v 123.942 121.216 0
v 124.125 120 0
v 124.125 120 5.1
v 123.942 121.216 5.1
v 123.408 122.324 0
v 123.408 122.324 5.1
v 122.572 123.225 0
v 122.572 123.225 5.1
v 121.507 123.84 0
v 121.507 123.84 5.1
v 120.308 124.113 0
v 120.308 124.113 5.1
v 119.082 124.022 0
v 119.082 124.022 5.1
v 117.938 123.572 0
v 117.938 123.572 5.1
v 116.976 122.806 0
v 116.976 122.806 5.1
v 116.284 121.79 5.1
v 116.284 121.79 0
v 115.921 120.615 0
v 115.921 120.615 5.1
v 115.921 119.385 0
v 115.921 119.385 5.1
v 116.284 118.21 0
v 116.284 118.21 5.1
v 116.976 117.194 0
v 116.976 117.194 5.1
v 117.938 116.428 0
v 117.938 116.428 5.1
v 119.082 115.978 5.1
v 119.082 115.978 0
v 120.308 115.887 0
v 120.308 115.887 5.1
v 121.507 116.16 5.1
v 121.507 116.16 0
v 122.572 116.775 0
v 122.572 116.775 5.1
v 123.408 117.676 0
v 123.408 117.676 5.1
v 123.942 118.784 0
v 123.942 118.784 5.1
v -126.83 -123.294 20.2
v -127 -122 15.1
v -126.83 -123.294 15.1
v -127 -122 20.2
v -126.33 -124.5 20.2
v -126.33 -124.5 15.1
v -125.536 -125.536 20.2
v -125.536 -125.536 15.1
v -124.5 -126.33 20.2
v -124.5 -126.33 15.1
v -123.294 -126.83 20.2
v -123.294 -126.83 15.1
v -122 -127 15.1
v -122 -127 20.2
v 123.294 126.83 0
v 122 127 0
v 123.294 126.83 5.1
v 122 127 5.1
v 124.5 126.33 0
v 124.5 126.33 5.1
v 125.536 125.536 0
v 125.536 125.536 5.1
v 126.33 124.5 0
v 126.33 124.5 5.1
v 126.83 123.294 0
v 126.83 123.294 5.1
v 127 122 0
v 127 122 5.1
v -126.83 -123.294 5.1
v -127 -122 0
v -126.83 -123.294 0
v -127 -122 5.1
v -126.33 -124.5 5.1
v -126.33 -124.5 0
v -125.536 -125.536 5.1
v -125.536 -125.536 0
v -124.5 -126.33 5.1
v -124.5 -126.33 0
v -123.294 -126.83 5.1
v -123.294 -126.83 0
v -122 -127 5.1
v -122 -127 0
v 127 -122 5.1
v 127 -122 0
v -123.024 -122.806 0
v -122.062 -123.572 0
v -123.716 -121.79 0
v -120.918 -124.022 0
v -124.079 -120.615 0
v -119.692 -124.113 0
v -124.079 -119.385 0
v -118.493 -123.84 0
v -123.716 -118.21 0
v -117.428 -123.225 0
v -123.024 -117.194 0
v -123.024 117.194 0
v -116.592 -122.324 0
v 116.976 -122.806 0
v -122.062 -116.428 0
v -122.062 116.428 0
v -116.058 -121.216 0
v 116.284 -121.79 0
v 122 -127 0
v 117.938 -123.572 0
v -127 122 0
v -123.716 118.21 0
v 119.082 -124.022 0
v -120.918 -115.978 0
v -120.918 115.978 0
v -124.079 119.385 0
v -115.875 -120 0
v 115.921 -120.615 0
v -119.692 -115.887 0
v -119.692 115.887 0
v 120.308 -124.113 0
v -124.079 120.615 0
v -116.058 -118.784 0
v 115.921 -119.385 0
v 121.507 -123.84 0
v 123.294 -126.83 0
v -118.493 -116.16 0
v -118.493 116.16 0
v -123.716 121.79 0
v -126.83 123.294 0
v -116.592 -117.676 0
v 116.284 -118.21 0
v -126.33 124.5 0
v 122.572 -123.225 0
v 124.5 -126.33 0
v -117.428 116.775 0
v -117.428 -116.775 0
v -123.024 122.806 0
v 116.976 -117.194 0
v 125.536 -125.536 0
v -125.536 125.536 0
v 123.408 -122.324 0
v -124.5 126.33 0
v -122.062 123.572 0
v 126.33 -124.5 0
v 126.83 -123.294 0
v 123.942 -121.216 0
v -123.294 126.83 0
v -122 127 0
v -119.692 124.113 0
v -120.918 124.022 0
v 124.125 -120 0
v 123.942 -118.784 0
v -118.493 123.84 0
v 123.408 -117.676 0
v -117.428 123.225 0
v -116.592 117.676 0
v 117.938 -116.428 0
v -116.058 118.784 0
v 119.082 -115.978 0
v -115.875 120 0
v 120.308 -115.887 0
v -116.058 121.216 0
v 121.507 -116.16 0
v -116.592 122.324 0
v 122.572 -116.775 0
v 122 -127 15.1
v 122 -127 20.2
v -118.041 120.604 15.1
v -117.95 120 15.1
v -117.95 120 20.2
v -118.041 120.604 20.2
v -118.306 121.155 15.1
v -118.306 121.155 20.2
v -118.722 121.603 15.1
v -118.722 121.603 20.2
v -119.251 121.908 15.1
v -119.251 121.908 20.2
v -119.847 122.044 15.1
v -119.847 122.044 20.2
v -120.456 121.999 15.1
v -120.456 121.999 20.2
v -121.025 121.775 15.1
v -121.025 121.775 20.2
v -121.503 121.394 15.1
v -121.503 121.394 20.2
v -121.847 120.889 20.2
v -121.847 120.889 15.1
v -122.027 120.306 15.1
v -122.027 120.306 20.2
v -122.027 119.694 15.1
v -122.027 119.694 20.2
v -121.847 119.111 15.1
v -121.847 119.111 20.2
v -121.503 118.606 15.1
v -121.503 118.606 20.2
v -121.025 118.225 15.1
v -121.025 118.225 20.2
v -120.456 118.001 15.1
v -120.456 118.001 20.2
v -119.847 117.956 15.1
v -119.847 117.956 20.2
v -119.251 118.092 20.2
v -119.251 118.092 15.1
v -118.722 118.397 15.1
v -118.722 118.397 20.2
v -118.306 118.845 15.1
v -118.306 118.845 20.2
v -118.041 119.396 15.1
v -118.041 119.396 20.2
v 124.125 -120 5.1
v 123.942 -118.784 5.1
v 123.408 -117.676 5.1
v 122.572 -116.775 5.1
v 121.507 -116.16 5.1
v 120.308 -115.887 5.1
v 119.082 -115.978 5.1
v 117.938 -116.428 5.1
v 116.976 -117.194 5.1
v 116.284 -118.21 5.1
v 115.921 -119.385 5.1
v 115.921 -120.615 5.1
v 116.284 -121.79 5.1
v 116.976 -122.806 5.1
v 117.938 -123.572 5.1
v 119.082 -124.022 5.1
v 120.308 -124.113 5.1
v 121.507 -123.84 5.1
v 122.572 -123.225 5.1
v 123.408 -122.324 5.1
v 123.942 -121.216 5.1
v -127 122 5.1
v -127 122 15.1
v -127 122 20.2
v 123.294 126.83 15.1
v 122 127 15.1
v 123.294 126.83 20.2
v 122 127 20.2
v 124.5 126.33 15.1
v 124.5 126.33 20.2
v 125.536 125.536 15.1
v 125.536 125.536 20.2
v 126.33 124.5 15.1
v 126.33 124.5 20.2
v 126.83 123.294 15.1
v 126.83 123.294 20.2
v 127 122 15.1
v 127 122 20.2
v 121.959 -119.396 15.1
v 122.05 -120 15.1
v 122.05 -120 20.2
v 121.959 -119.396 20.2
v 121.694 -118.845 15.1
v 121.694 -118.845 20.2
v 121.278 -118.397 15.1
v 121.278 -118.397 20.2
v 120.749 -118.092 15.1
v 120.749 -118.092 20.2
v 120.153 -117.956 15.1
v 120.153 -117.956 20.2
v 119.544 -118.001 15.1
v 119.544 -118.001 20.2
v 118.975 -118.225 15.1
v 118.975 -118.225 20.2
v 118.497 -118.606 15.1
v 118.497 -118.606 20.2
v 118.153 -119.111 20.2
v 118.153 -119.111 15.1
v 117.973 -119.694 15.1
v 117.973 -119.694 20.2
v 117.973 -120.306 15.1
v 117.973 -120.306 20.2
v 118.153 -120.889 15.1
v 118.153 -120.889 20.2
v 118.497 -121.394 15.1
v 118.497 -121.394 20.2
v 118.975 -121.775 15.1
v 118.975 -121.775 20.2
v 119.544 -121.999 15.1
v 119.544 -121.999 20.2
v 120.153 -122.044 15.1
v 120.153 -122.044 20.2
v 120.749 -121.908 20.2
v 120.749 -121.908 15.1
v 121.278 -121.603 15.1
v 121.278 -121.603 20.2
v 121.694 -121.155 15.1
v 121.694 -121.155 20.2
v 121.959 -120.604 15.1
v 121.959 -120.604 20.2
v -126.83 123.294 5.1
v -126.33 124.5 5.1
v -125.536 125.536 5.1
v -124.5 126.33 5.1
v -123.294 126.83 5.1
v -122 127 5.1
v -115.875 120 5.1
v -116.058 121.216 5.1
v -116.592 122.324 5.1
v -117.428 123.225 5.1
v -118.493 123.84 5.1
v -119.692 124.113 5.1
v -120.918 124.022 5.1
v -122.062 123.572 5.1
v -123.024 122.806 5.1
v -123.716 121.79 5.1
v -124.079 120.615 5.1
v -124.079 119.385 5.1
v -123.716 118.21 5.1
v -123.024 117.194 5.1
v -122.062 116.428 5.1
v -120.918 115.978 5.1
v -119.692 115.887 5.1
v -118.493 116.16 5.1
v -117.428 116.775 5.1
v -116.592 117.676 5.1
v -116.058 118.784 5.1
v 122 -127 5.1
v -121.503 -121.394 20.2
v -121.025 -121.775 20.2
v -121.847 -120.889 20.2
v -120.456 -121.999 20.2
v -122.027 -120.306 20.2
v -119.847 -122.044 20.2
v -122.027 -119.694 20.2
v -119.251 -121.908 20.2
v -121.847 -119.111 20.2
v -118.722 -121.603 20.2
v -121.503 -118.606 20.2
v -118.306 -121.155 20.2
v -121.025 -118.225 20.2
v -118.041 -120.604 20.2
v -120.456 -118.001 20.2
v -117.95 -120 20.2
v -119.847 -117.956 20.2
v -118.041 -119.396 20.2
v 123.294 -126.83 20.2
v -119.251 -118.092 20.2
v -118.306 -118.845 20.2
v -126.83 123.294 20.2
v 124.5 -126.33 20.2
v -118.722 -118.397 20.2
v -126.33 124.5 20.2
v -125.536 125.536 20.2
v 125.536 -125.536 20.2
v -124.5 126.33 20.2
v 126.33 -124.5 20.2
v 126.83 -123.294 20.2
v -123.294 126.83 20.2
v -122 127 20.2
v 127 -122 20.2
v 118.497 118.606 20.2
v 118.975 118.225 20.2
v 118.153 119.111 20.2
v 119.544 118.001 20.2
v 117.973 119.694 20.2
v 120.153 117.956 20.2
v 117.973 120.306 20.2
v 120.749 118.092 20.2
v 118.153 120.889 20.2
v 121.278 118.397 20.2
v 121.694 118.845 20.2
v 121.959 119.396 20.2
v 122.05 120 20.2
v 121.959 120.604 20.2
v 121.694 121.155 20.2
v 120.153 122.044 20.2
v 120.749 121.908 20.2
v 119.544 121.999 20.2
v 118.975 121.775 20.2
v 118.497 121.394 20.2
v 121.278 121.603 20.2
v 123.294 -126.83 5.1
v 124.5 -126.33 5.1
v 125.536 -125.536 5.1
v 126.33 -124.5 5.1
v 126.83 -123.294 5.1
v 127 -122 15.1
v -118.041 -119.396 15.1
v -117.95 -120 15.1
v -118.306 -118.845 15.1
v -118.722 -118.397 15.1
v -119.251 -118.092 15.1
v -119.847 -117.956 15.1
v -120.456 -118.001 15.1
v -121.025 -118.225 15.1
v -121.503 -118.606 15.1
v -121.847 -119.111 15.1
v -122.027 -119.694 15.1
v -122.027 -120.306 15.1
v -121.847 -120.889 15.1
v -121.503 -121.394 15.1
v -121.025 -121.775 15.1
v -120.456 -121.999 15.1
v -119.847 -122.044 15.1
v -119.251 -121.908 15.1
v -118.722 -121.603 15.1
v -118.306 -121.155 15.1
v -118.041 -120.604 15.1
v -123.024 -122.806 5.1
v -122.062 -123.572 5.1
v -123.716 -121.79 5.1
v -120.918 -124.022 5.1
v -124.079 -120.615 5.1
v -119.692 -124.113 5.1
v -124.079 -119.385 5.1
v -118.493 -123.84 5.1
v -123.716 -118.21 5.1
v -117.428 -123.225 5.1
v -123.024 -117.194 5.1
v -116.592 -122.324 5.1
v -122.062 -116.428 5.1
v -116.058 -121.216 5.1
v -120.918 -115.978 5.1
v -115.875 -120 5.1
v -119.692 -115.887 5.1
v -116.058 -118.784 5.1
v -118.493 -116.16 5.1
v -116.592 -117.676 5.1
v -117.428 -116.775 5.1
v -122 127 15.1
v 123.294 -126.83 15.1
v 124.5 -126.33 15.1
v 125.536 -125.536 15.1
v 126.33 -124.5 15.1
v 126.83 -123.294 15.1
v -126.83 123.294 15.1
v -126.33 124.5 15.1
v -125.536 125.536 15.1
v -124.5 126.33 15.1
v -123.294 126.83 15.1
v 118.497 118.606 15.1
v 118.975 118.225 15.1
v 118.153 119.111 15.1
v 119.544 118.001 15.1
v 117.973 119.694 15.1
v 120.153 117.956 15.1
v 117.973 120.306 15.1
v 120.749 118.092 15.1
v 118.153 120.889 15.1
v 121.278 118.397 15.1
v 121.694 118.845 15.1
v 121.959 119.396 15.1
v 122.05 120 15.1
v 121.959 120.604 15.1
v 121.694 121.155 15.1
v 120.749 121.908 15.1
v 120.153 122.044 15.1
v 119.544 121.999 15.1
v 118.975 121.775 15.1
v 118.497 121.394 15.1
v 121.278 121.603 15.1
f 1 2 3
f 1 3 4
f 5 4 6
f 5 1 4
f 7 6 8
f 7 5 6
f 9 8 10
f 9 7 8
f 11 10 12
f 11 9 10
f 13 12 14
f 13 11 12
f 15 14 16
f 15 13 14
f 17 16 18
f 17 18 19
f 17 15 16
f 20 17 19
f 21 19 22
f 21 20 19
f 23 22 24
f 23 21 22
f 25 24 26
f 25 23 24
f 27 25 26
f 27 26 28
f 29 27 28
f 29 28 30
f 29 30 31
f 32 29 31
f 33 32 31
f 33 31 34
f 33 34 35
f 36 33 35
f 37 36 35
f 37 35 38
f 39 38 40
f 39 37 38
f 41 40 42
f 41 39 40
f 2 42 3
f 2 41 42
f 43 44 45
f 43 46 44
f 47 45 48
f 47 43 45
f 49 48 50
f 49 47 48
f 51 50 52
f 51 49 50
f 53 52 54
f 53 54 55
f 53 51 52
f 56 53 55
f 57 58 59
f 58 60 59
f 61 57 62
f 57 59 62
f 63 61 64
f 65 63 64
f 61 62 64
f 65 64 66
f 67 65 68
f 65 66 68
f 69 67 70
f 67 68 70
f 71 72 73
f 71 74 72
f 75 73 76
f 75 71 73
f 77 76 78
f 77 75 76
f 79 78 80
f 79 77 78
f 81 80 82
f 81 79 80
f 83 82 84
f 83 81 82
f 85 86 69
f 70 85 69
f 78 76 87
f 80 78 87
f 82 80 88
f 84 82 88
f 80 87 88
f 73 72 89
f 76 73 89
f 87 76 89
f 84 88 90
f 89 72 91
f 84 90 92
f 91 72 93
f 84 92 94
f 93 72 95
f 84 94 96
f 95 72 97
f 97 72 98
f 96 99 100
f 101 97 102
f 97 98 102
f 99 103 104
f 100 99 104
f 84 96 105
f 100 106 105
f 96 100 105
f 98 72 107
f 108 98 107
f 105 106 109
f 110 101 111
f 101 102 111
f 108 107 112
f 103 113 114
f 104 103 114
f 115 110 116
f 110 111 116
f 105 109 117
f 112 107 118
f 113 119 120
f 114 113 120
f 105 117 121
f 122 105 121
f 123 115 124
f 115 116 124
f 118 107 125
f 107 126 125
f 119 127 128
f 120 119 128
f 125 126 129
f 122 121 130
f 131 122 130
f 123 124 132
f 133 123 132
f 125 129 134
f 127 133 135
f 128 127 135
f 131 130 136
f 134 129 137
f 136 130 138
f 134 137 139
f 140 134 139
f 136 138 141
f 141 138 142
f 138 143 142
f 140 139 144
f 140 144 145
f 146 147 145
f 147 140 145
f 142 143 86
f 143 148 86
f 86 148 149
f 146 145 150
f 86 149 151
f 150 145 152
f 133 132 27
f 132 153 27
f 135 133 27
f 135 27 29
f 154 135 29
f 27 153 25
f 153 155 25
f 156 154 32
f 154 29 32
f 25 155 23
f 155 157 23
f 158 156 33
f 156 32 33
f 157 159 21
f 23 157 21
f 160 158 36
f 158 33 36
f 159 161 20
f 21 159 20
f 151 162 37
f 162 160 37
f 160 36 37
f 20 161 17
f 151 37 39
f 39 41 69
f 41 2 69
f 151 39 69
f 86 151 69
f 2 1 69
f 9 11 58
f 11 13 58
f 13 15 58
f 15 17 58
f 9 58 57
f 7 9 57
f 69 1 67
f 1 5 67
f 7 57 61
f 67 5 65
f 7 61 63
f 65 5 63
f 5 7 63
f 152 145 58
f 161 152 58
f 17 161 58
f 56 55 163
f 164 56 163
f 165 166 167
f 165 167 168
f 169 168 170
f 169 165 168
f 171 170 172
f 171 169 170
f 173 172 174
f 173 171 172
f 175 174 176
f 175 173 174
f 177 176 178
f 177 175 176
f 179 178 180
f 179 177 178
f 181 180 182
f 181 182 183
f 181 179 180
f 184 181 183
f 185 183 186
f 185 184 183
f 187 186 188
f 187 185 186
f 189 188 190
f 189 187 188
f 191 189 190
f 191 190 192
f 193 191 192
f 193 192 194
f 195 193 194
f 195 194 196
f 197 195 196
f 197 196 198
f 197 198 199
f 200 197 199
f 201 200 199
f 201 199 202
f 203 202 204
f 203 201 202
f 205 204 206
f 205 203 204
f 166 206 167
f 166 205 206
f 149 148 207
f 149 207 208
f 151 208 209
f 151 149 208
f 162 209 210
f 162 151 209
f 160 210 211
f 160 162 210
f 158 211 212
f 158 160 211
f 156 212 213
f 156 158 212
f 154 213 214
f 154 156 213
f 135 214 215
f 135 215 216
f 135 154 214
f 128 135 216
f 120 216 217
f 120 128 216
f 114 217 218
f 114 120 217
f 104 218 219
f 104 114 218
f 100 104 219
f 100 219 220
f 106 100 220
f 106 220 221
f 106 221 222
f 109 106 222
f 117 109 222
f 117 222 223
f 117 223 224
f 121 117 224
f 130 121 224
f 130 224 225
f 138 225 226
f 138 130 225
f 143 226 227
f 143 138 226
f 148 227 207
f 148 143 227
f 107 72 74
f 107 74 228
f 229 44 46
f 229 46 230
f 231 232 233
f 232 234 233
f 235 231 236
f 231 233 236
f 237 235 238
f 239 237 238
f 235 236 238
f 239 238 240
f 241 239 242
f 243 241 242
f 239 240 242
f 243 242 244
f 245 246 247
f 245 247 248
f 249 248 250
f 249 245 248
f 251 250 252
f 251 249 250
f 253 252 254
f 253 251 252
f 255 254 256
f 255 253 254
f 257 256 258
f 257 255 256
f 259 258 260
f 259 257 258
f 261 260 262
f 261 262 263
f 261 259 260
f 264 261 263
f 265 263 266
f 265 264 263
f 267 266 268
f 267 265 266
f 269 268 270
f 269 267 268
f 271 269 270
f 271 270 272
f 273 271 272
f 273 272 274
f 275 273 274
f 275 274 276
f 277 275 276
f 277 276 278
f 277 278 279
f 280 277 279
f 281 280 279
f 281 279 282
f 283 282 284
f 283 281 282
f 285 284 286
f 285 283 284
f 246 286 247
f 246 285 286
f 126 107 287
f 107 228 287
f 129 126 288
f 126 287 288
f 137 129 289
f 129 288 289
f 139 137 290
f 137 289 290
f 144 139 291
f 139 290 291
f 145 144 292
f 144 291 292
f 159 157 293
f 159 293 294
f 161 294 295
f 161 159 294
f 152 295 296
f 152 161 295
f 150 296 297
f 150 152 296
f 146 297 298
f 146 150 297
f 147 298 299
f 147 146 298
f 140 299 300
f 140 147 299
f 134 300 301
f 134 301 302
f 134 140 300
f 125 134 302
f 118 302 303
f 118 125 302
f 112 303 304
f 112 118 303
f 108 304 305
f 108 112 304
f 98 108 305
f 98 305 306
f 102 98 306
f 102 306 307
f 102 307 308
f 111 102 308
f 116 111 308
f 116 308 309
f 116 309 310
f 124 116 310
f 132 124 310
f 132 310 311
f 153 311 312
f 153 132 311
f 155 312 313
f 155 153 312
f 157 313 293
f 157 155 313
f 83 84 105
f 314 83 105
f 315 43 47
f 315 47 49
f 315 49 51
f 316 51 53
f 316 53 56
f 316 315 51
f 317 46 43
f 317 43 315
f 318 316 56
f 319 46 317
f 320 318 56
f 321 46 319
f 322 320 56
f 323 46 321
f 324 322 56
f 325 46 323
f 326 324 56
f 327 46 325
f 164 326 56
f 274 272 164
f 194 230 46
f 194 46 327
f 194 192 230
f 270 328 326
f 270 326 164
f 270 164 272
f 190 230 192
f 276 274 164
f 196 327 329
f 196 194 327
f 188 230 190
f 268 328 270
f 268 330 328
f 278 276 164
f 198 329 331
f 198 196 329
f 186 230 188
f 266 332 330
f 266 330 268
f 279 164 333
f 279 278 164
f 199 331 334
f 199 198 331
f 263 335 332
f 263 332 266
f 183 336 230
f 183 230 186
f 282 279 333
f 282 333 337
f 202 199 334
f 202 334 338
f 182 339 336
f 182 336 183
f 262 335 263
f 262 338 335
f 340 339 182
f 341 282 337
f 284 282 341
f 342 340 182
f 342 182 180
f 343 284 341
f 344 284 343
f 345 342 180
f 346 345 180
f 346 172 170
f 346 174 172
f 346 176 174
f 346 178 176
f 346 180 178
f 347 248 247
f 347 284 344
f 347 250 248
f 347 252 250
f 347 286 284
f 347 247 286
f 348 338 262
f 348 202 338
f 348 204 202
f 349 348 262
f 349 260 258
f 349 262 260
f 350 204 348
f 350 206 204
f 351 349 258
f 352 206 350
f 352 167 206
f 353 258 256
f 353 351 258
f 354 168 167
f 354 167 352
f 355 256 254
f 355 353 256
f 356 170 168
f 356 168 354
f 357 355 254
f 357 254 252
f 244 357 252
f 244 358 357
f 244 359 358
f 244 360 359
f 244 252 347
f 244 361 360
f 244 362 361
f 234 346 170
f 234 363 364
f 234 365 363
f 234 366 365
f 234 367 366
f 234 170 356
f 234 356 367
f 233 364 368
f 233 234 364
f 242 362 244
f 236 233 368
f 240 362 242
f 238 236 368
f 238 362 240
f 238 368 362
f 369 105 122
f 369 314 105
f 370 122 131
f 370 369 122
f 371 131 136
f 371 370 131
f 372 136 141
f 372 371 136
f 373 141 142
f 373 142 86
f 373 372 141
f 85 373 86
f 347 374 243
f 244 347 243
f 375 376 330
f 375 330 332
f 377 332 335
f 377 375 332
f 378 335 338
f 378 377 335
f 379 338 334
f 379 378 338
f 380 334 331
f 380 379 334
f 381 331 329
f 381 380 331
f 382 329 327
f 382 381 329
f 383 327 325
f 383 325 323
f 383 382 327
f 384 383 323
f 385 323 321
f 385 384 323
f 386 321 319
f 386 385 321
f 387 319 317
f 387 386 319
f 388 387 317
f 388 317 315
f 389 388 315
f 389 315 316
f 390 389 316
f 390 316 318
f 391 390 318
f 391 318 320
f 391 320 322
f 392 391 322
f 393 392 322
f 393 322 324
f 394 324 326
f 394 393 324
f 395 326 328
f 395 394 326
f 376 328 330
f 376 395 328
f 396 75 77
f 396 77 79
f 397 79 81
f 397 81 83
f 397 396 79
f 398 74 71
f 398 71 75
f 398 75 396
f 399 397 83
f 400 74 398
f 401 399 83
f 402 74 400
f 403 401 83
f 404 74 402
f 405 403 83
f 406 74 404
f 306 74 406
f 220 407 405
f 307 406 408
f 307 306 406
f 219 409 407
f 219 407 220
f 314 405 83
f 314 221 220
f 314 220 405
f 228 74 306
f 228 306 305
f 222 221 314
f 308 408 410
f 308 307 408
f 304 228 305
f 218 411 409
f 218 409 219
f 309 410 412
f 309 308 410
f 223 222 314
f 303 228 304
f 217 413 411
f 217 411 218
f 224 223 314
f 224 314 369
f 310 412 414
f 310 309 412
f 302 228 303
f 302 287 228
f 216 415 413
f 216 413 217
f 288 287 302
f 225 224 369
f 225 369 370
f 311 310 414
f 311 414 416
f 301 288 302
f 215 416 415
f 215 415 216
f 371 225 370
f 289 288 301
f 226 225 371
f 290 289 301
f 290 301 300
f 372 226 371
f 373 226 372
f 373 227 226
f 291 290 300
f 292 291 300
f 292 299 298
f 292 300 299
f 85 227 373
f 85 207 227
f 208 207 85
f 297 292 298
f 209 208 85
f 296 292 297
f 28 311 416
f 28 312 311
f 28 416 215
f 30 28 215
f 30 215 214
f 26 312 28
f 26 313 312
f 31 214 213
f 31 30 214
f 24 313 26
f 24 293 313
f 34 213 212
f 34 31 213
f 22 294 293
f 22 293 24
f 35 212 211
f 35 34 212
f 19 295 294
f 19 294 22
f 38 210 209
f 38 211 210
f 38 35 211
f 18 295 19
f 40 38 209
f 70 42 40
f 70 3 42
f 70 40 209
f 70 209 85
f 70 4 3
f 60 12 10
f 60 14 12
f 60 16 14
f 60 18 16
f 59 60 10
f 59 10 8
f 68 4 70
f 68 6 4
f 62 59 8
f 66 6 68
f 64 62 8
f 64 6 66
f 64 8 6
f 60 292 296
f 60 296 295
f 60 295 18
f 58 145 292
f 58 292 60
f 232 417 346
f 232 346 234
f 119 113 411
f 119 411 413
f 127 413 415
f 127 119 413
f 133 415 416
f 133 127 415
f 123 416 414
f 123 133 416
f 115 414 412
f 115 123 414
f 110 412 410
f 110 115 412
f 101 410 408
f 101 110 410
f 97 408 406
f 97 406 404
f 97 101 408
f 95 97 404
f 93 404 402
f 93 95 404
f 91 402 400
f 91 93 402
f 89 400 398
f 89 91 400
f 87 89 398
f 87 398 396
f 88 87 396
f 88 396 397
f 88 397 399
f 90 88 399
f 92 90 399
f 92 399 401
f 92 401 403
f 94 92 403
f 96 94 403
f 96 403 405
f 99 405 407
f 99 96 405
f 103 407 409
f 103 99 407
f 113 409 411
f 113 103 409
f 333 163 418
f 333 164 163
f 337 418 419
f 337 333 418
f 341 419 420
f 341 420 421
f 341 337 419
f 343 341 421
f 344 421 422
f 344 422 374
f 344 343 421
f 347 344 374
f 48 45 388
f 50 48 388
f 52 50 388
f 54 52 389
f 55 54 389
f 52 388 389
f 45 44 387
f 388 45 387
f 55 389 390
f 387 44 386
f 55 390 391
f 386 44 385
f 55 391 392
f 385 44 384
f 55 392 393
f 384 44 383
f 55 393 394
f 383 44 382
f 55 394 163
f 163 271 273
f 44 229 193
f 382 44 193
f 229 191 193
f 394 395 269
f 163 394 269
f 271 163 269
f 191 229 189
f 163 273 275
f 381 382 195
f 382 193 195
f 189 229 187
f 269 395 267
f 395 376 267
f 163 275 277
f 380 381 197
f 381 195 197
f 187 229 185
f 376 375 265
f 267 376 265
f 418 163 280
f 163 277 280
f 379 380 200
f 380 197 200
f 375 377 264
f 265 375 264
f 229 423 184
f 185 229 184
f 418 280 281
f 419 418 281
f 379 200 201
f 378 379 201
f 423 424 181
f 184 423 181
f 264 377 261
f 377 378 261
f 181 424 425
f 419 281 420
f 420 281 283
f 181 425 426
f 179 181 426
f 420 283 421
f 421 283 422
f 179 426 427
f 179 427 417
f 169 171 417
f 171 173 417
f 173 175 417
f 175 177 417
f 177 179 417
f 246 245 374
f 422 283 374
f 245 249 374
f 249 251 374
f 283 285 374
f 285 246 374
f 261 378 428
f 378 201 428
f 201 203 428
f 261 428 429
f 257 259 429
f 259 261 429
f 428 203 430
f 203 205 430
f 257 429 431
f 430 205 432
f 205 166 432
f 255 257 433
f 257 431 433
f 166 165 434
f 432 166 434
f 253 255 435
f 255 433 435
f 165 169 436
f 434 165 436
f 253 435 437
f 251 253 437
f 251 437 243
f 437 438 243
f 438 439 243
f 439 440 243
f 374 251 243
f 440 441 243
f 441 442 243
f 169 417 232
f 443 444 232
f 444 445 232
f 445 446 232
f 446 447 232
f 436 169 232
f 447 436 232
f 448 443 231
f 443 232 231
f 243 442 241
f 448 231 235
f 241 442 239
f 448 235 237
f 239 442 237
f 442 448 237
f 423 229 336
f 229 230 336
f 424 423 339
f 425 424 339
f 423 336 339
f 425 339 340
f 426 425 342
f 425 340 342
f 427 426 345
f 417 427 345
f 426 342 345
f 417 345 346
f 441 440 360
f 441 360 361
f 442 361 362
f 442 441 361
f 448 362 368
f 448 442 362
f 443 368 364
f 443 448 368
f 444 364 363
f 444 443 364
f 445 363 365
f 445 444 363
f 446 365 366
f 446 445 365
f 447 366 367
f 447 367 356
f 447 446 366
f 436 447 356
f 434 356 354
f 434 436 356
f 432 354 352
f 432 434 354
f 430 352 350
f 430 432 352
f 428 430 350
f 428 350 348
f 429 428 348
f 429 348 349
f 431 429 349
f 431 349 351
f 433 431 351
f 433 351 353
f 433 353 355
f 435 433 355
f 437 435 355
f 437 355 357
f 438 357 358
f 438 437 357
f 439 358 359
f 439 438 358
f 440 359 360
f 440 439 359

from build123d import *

# Parameters (mm, degrees)
F0_W     = 254
F0_H     = 254
F0_R     = 4.125
F1_DEPTH = 5.1
F3_W     = 254
F3_H     = 254
F3_R     = 2.05
F4_DEPTH = 5.1
F5_R     = 5
F6_R     = 5


with BuildPart() as f1:
    # F0 (on Top) → F1 (new body)
    with BuildSketch(Plane.XY):
        Rectangle(F0_W, F0_H)
        with Locations((-120, -120)):
            Circle(F0_R, mode=Mode.SUBTRACT)
        with Locations((120, -120)):
            Circle(F0_R, mode=Mode.SUBTRACT)
        with Locations((-120, 120)):
            Circle(F0_R, mode=Mode.SUBTRACT)
        with Locations((120, 120)):
            Circle(F0_R, mode=Mode.SUBTRACT)
    extrude(amount=F1_DEPTH)

    # F5
    f5_edges = [f1.edges().sort_by_distance(p)[0] for p in [
        (-127, 127, 2.55),
        (127, 127, 2.55),
        (127, -127, 2.55),
        (-127, -127, 2.55),
    ]]
    fillet(f5_edges, radius=F5_R)


with BuildPart() as f4:
    # F3 (on offset) → F4 (new body)
    with BuildSketch(Plane.XY.offset(15.1)):
        Rectangle(F3_W, F3_H)
        with Locations((-120, -120)):
            Circle(F3_R, mode=Mode.SUBTRACT)
        with Locations((120, -120)):
            Circle(F3_R, mode=Mode.SUBTRACT)
        with Locations((-120, 120)):
            Circle(F3_R, mode=Mode.SUBTRACT)
        with Locations((120, 120)):
            Circle(F3_R, mode=Mode.SUBTRACT)
    extrude(amount=F4_DEPTH)

    # F6
    f6_edges = [f4.edges().sort_by_distance(p)[0] for p in [
        (-127, -127, 17.65),
        (127, -127, 17.65),
        (127, 127, 17.65),
        (-127, 127, 17.65),
    ]]
    fillet(f6_edges, radius=F6_R)


solid = Compound([f1.part, f4.part])
